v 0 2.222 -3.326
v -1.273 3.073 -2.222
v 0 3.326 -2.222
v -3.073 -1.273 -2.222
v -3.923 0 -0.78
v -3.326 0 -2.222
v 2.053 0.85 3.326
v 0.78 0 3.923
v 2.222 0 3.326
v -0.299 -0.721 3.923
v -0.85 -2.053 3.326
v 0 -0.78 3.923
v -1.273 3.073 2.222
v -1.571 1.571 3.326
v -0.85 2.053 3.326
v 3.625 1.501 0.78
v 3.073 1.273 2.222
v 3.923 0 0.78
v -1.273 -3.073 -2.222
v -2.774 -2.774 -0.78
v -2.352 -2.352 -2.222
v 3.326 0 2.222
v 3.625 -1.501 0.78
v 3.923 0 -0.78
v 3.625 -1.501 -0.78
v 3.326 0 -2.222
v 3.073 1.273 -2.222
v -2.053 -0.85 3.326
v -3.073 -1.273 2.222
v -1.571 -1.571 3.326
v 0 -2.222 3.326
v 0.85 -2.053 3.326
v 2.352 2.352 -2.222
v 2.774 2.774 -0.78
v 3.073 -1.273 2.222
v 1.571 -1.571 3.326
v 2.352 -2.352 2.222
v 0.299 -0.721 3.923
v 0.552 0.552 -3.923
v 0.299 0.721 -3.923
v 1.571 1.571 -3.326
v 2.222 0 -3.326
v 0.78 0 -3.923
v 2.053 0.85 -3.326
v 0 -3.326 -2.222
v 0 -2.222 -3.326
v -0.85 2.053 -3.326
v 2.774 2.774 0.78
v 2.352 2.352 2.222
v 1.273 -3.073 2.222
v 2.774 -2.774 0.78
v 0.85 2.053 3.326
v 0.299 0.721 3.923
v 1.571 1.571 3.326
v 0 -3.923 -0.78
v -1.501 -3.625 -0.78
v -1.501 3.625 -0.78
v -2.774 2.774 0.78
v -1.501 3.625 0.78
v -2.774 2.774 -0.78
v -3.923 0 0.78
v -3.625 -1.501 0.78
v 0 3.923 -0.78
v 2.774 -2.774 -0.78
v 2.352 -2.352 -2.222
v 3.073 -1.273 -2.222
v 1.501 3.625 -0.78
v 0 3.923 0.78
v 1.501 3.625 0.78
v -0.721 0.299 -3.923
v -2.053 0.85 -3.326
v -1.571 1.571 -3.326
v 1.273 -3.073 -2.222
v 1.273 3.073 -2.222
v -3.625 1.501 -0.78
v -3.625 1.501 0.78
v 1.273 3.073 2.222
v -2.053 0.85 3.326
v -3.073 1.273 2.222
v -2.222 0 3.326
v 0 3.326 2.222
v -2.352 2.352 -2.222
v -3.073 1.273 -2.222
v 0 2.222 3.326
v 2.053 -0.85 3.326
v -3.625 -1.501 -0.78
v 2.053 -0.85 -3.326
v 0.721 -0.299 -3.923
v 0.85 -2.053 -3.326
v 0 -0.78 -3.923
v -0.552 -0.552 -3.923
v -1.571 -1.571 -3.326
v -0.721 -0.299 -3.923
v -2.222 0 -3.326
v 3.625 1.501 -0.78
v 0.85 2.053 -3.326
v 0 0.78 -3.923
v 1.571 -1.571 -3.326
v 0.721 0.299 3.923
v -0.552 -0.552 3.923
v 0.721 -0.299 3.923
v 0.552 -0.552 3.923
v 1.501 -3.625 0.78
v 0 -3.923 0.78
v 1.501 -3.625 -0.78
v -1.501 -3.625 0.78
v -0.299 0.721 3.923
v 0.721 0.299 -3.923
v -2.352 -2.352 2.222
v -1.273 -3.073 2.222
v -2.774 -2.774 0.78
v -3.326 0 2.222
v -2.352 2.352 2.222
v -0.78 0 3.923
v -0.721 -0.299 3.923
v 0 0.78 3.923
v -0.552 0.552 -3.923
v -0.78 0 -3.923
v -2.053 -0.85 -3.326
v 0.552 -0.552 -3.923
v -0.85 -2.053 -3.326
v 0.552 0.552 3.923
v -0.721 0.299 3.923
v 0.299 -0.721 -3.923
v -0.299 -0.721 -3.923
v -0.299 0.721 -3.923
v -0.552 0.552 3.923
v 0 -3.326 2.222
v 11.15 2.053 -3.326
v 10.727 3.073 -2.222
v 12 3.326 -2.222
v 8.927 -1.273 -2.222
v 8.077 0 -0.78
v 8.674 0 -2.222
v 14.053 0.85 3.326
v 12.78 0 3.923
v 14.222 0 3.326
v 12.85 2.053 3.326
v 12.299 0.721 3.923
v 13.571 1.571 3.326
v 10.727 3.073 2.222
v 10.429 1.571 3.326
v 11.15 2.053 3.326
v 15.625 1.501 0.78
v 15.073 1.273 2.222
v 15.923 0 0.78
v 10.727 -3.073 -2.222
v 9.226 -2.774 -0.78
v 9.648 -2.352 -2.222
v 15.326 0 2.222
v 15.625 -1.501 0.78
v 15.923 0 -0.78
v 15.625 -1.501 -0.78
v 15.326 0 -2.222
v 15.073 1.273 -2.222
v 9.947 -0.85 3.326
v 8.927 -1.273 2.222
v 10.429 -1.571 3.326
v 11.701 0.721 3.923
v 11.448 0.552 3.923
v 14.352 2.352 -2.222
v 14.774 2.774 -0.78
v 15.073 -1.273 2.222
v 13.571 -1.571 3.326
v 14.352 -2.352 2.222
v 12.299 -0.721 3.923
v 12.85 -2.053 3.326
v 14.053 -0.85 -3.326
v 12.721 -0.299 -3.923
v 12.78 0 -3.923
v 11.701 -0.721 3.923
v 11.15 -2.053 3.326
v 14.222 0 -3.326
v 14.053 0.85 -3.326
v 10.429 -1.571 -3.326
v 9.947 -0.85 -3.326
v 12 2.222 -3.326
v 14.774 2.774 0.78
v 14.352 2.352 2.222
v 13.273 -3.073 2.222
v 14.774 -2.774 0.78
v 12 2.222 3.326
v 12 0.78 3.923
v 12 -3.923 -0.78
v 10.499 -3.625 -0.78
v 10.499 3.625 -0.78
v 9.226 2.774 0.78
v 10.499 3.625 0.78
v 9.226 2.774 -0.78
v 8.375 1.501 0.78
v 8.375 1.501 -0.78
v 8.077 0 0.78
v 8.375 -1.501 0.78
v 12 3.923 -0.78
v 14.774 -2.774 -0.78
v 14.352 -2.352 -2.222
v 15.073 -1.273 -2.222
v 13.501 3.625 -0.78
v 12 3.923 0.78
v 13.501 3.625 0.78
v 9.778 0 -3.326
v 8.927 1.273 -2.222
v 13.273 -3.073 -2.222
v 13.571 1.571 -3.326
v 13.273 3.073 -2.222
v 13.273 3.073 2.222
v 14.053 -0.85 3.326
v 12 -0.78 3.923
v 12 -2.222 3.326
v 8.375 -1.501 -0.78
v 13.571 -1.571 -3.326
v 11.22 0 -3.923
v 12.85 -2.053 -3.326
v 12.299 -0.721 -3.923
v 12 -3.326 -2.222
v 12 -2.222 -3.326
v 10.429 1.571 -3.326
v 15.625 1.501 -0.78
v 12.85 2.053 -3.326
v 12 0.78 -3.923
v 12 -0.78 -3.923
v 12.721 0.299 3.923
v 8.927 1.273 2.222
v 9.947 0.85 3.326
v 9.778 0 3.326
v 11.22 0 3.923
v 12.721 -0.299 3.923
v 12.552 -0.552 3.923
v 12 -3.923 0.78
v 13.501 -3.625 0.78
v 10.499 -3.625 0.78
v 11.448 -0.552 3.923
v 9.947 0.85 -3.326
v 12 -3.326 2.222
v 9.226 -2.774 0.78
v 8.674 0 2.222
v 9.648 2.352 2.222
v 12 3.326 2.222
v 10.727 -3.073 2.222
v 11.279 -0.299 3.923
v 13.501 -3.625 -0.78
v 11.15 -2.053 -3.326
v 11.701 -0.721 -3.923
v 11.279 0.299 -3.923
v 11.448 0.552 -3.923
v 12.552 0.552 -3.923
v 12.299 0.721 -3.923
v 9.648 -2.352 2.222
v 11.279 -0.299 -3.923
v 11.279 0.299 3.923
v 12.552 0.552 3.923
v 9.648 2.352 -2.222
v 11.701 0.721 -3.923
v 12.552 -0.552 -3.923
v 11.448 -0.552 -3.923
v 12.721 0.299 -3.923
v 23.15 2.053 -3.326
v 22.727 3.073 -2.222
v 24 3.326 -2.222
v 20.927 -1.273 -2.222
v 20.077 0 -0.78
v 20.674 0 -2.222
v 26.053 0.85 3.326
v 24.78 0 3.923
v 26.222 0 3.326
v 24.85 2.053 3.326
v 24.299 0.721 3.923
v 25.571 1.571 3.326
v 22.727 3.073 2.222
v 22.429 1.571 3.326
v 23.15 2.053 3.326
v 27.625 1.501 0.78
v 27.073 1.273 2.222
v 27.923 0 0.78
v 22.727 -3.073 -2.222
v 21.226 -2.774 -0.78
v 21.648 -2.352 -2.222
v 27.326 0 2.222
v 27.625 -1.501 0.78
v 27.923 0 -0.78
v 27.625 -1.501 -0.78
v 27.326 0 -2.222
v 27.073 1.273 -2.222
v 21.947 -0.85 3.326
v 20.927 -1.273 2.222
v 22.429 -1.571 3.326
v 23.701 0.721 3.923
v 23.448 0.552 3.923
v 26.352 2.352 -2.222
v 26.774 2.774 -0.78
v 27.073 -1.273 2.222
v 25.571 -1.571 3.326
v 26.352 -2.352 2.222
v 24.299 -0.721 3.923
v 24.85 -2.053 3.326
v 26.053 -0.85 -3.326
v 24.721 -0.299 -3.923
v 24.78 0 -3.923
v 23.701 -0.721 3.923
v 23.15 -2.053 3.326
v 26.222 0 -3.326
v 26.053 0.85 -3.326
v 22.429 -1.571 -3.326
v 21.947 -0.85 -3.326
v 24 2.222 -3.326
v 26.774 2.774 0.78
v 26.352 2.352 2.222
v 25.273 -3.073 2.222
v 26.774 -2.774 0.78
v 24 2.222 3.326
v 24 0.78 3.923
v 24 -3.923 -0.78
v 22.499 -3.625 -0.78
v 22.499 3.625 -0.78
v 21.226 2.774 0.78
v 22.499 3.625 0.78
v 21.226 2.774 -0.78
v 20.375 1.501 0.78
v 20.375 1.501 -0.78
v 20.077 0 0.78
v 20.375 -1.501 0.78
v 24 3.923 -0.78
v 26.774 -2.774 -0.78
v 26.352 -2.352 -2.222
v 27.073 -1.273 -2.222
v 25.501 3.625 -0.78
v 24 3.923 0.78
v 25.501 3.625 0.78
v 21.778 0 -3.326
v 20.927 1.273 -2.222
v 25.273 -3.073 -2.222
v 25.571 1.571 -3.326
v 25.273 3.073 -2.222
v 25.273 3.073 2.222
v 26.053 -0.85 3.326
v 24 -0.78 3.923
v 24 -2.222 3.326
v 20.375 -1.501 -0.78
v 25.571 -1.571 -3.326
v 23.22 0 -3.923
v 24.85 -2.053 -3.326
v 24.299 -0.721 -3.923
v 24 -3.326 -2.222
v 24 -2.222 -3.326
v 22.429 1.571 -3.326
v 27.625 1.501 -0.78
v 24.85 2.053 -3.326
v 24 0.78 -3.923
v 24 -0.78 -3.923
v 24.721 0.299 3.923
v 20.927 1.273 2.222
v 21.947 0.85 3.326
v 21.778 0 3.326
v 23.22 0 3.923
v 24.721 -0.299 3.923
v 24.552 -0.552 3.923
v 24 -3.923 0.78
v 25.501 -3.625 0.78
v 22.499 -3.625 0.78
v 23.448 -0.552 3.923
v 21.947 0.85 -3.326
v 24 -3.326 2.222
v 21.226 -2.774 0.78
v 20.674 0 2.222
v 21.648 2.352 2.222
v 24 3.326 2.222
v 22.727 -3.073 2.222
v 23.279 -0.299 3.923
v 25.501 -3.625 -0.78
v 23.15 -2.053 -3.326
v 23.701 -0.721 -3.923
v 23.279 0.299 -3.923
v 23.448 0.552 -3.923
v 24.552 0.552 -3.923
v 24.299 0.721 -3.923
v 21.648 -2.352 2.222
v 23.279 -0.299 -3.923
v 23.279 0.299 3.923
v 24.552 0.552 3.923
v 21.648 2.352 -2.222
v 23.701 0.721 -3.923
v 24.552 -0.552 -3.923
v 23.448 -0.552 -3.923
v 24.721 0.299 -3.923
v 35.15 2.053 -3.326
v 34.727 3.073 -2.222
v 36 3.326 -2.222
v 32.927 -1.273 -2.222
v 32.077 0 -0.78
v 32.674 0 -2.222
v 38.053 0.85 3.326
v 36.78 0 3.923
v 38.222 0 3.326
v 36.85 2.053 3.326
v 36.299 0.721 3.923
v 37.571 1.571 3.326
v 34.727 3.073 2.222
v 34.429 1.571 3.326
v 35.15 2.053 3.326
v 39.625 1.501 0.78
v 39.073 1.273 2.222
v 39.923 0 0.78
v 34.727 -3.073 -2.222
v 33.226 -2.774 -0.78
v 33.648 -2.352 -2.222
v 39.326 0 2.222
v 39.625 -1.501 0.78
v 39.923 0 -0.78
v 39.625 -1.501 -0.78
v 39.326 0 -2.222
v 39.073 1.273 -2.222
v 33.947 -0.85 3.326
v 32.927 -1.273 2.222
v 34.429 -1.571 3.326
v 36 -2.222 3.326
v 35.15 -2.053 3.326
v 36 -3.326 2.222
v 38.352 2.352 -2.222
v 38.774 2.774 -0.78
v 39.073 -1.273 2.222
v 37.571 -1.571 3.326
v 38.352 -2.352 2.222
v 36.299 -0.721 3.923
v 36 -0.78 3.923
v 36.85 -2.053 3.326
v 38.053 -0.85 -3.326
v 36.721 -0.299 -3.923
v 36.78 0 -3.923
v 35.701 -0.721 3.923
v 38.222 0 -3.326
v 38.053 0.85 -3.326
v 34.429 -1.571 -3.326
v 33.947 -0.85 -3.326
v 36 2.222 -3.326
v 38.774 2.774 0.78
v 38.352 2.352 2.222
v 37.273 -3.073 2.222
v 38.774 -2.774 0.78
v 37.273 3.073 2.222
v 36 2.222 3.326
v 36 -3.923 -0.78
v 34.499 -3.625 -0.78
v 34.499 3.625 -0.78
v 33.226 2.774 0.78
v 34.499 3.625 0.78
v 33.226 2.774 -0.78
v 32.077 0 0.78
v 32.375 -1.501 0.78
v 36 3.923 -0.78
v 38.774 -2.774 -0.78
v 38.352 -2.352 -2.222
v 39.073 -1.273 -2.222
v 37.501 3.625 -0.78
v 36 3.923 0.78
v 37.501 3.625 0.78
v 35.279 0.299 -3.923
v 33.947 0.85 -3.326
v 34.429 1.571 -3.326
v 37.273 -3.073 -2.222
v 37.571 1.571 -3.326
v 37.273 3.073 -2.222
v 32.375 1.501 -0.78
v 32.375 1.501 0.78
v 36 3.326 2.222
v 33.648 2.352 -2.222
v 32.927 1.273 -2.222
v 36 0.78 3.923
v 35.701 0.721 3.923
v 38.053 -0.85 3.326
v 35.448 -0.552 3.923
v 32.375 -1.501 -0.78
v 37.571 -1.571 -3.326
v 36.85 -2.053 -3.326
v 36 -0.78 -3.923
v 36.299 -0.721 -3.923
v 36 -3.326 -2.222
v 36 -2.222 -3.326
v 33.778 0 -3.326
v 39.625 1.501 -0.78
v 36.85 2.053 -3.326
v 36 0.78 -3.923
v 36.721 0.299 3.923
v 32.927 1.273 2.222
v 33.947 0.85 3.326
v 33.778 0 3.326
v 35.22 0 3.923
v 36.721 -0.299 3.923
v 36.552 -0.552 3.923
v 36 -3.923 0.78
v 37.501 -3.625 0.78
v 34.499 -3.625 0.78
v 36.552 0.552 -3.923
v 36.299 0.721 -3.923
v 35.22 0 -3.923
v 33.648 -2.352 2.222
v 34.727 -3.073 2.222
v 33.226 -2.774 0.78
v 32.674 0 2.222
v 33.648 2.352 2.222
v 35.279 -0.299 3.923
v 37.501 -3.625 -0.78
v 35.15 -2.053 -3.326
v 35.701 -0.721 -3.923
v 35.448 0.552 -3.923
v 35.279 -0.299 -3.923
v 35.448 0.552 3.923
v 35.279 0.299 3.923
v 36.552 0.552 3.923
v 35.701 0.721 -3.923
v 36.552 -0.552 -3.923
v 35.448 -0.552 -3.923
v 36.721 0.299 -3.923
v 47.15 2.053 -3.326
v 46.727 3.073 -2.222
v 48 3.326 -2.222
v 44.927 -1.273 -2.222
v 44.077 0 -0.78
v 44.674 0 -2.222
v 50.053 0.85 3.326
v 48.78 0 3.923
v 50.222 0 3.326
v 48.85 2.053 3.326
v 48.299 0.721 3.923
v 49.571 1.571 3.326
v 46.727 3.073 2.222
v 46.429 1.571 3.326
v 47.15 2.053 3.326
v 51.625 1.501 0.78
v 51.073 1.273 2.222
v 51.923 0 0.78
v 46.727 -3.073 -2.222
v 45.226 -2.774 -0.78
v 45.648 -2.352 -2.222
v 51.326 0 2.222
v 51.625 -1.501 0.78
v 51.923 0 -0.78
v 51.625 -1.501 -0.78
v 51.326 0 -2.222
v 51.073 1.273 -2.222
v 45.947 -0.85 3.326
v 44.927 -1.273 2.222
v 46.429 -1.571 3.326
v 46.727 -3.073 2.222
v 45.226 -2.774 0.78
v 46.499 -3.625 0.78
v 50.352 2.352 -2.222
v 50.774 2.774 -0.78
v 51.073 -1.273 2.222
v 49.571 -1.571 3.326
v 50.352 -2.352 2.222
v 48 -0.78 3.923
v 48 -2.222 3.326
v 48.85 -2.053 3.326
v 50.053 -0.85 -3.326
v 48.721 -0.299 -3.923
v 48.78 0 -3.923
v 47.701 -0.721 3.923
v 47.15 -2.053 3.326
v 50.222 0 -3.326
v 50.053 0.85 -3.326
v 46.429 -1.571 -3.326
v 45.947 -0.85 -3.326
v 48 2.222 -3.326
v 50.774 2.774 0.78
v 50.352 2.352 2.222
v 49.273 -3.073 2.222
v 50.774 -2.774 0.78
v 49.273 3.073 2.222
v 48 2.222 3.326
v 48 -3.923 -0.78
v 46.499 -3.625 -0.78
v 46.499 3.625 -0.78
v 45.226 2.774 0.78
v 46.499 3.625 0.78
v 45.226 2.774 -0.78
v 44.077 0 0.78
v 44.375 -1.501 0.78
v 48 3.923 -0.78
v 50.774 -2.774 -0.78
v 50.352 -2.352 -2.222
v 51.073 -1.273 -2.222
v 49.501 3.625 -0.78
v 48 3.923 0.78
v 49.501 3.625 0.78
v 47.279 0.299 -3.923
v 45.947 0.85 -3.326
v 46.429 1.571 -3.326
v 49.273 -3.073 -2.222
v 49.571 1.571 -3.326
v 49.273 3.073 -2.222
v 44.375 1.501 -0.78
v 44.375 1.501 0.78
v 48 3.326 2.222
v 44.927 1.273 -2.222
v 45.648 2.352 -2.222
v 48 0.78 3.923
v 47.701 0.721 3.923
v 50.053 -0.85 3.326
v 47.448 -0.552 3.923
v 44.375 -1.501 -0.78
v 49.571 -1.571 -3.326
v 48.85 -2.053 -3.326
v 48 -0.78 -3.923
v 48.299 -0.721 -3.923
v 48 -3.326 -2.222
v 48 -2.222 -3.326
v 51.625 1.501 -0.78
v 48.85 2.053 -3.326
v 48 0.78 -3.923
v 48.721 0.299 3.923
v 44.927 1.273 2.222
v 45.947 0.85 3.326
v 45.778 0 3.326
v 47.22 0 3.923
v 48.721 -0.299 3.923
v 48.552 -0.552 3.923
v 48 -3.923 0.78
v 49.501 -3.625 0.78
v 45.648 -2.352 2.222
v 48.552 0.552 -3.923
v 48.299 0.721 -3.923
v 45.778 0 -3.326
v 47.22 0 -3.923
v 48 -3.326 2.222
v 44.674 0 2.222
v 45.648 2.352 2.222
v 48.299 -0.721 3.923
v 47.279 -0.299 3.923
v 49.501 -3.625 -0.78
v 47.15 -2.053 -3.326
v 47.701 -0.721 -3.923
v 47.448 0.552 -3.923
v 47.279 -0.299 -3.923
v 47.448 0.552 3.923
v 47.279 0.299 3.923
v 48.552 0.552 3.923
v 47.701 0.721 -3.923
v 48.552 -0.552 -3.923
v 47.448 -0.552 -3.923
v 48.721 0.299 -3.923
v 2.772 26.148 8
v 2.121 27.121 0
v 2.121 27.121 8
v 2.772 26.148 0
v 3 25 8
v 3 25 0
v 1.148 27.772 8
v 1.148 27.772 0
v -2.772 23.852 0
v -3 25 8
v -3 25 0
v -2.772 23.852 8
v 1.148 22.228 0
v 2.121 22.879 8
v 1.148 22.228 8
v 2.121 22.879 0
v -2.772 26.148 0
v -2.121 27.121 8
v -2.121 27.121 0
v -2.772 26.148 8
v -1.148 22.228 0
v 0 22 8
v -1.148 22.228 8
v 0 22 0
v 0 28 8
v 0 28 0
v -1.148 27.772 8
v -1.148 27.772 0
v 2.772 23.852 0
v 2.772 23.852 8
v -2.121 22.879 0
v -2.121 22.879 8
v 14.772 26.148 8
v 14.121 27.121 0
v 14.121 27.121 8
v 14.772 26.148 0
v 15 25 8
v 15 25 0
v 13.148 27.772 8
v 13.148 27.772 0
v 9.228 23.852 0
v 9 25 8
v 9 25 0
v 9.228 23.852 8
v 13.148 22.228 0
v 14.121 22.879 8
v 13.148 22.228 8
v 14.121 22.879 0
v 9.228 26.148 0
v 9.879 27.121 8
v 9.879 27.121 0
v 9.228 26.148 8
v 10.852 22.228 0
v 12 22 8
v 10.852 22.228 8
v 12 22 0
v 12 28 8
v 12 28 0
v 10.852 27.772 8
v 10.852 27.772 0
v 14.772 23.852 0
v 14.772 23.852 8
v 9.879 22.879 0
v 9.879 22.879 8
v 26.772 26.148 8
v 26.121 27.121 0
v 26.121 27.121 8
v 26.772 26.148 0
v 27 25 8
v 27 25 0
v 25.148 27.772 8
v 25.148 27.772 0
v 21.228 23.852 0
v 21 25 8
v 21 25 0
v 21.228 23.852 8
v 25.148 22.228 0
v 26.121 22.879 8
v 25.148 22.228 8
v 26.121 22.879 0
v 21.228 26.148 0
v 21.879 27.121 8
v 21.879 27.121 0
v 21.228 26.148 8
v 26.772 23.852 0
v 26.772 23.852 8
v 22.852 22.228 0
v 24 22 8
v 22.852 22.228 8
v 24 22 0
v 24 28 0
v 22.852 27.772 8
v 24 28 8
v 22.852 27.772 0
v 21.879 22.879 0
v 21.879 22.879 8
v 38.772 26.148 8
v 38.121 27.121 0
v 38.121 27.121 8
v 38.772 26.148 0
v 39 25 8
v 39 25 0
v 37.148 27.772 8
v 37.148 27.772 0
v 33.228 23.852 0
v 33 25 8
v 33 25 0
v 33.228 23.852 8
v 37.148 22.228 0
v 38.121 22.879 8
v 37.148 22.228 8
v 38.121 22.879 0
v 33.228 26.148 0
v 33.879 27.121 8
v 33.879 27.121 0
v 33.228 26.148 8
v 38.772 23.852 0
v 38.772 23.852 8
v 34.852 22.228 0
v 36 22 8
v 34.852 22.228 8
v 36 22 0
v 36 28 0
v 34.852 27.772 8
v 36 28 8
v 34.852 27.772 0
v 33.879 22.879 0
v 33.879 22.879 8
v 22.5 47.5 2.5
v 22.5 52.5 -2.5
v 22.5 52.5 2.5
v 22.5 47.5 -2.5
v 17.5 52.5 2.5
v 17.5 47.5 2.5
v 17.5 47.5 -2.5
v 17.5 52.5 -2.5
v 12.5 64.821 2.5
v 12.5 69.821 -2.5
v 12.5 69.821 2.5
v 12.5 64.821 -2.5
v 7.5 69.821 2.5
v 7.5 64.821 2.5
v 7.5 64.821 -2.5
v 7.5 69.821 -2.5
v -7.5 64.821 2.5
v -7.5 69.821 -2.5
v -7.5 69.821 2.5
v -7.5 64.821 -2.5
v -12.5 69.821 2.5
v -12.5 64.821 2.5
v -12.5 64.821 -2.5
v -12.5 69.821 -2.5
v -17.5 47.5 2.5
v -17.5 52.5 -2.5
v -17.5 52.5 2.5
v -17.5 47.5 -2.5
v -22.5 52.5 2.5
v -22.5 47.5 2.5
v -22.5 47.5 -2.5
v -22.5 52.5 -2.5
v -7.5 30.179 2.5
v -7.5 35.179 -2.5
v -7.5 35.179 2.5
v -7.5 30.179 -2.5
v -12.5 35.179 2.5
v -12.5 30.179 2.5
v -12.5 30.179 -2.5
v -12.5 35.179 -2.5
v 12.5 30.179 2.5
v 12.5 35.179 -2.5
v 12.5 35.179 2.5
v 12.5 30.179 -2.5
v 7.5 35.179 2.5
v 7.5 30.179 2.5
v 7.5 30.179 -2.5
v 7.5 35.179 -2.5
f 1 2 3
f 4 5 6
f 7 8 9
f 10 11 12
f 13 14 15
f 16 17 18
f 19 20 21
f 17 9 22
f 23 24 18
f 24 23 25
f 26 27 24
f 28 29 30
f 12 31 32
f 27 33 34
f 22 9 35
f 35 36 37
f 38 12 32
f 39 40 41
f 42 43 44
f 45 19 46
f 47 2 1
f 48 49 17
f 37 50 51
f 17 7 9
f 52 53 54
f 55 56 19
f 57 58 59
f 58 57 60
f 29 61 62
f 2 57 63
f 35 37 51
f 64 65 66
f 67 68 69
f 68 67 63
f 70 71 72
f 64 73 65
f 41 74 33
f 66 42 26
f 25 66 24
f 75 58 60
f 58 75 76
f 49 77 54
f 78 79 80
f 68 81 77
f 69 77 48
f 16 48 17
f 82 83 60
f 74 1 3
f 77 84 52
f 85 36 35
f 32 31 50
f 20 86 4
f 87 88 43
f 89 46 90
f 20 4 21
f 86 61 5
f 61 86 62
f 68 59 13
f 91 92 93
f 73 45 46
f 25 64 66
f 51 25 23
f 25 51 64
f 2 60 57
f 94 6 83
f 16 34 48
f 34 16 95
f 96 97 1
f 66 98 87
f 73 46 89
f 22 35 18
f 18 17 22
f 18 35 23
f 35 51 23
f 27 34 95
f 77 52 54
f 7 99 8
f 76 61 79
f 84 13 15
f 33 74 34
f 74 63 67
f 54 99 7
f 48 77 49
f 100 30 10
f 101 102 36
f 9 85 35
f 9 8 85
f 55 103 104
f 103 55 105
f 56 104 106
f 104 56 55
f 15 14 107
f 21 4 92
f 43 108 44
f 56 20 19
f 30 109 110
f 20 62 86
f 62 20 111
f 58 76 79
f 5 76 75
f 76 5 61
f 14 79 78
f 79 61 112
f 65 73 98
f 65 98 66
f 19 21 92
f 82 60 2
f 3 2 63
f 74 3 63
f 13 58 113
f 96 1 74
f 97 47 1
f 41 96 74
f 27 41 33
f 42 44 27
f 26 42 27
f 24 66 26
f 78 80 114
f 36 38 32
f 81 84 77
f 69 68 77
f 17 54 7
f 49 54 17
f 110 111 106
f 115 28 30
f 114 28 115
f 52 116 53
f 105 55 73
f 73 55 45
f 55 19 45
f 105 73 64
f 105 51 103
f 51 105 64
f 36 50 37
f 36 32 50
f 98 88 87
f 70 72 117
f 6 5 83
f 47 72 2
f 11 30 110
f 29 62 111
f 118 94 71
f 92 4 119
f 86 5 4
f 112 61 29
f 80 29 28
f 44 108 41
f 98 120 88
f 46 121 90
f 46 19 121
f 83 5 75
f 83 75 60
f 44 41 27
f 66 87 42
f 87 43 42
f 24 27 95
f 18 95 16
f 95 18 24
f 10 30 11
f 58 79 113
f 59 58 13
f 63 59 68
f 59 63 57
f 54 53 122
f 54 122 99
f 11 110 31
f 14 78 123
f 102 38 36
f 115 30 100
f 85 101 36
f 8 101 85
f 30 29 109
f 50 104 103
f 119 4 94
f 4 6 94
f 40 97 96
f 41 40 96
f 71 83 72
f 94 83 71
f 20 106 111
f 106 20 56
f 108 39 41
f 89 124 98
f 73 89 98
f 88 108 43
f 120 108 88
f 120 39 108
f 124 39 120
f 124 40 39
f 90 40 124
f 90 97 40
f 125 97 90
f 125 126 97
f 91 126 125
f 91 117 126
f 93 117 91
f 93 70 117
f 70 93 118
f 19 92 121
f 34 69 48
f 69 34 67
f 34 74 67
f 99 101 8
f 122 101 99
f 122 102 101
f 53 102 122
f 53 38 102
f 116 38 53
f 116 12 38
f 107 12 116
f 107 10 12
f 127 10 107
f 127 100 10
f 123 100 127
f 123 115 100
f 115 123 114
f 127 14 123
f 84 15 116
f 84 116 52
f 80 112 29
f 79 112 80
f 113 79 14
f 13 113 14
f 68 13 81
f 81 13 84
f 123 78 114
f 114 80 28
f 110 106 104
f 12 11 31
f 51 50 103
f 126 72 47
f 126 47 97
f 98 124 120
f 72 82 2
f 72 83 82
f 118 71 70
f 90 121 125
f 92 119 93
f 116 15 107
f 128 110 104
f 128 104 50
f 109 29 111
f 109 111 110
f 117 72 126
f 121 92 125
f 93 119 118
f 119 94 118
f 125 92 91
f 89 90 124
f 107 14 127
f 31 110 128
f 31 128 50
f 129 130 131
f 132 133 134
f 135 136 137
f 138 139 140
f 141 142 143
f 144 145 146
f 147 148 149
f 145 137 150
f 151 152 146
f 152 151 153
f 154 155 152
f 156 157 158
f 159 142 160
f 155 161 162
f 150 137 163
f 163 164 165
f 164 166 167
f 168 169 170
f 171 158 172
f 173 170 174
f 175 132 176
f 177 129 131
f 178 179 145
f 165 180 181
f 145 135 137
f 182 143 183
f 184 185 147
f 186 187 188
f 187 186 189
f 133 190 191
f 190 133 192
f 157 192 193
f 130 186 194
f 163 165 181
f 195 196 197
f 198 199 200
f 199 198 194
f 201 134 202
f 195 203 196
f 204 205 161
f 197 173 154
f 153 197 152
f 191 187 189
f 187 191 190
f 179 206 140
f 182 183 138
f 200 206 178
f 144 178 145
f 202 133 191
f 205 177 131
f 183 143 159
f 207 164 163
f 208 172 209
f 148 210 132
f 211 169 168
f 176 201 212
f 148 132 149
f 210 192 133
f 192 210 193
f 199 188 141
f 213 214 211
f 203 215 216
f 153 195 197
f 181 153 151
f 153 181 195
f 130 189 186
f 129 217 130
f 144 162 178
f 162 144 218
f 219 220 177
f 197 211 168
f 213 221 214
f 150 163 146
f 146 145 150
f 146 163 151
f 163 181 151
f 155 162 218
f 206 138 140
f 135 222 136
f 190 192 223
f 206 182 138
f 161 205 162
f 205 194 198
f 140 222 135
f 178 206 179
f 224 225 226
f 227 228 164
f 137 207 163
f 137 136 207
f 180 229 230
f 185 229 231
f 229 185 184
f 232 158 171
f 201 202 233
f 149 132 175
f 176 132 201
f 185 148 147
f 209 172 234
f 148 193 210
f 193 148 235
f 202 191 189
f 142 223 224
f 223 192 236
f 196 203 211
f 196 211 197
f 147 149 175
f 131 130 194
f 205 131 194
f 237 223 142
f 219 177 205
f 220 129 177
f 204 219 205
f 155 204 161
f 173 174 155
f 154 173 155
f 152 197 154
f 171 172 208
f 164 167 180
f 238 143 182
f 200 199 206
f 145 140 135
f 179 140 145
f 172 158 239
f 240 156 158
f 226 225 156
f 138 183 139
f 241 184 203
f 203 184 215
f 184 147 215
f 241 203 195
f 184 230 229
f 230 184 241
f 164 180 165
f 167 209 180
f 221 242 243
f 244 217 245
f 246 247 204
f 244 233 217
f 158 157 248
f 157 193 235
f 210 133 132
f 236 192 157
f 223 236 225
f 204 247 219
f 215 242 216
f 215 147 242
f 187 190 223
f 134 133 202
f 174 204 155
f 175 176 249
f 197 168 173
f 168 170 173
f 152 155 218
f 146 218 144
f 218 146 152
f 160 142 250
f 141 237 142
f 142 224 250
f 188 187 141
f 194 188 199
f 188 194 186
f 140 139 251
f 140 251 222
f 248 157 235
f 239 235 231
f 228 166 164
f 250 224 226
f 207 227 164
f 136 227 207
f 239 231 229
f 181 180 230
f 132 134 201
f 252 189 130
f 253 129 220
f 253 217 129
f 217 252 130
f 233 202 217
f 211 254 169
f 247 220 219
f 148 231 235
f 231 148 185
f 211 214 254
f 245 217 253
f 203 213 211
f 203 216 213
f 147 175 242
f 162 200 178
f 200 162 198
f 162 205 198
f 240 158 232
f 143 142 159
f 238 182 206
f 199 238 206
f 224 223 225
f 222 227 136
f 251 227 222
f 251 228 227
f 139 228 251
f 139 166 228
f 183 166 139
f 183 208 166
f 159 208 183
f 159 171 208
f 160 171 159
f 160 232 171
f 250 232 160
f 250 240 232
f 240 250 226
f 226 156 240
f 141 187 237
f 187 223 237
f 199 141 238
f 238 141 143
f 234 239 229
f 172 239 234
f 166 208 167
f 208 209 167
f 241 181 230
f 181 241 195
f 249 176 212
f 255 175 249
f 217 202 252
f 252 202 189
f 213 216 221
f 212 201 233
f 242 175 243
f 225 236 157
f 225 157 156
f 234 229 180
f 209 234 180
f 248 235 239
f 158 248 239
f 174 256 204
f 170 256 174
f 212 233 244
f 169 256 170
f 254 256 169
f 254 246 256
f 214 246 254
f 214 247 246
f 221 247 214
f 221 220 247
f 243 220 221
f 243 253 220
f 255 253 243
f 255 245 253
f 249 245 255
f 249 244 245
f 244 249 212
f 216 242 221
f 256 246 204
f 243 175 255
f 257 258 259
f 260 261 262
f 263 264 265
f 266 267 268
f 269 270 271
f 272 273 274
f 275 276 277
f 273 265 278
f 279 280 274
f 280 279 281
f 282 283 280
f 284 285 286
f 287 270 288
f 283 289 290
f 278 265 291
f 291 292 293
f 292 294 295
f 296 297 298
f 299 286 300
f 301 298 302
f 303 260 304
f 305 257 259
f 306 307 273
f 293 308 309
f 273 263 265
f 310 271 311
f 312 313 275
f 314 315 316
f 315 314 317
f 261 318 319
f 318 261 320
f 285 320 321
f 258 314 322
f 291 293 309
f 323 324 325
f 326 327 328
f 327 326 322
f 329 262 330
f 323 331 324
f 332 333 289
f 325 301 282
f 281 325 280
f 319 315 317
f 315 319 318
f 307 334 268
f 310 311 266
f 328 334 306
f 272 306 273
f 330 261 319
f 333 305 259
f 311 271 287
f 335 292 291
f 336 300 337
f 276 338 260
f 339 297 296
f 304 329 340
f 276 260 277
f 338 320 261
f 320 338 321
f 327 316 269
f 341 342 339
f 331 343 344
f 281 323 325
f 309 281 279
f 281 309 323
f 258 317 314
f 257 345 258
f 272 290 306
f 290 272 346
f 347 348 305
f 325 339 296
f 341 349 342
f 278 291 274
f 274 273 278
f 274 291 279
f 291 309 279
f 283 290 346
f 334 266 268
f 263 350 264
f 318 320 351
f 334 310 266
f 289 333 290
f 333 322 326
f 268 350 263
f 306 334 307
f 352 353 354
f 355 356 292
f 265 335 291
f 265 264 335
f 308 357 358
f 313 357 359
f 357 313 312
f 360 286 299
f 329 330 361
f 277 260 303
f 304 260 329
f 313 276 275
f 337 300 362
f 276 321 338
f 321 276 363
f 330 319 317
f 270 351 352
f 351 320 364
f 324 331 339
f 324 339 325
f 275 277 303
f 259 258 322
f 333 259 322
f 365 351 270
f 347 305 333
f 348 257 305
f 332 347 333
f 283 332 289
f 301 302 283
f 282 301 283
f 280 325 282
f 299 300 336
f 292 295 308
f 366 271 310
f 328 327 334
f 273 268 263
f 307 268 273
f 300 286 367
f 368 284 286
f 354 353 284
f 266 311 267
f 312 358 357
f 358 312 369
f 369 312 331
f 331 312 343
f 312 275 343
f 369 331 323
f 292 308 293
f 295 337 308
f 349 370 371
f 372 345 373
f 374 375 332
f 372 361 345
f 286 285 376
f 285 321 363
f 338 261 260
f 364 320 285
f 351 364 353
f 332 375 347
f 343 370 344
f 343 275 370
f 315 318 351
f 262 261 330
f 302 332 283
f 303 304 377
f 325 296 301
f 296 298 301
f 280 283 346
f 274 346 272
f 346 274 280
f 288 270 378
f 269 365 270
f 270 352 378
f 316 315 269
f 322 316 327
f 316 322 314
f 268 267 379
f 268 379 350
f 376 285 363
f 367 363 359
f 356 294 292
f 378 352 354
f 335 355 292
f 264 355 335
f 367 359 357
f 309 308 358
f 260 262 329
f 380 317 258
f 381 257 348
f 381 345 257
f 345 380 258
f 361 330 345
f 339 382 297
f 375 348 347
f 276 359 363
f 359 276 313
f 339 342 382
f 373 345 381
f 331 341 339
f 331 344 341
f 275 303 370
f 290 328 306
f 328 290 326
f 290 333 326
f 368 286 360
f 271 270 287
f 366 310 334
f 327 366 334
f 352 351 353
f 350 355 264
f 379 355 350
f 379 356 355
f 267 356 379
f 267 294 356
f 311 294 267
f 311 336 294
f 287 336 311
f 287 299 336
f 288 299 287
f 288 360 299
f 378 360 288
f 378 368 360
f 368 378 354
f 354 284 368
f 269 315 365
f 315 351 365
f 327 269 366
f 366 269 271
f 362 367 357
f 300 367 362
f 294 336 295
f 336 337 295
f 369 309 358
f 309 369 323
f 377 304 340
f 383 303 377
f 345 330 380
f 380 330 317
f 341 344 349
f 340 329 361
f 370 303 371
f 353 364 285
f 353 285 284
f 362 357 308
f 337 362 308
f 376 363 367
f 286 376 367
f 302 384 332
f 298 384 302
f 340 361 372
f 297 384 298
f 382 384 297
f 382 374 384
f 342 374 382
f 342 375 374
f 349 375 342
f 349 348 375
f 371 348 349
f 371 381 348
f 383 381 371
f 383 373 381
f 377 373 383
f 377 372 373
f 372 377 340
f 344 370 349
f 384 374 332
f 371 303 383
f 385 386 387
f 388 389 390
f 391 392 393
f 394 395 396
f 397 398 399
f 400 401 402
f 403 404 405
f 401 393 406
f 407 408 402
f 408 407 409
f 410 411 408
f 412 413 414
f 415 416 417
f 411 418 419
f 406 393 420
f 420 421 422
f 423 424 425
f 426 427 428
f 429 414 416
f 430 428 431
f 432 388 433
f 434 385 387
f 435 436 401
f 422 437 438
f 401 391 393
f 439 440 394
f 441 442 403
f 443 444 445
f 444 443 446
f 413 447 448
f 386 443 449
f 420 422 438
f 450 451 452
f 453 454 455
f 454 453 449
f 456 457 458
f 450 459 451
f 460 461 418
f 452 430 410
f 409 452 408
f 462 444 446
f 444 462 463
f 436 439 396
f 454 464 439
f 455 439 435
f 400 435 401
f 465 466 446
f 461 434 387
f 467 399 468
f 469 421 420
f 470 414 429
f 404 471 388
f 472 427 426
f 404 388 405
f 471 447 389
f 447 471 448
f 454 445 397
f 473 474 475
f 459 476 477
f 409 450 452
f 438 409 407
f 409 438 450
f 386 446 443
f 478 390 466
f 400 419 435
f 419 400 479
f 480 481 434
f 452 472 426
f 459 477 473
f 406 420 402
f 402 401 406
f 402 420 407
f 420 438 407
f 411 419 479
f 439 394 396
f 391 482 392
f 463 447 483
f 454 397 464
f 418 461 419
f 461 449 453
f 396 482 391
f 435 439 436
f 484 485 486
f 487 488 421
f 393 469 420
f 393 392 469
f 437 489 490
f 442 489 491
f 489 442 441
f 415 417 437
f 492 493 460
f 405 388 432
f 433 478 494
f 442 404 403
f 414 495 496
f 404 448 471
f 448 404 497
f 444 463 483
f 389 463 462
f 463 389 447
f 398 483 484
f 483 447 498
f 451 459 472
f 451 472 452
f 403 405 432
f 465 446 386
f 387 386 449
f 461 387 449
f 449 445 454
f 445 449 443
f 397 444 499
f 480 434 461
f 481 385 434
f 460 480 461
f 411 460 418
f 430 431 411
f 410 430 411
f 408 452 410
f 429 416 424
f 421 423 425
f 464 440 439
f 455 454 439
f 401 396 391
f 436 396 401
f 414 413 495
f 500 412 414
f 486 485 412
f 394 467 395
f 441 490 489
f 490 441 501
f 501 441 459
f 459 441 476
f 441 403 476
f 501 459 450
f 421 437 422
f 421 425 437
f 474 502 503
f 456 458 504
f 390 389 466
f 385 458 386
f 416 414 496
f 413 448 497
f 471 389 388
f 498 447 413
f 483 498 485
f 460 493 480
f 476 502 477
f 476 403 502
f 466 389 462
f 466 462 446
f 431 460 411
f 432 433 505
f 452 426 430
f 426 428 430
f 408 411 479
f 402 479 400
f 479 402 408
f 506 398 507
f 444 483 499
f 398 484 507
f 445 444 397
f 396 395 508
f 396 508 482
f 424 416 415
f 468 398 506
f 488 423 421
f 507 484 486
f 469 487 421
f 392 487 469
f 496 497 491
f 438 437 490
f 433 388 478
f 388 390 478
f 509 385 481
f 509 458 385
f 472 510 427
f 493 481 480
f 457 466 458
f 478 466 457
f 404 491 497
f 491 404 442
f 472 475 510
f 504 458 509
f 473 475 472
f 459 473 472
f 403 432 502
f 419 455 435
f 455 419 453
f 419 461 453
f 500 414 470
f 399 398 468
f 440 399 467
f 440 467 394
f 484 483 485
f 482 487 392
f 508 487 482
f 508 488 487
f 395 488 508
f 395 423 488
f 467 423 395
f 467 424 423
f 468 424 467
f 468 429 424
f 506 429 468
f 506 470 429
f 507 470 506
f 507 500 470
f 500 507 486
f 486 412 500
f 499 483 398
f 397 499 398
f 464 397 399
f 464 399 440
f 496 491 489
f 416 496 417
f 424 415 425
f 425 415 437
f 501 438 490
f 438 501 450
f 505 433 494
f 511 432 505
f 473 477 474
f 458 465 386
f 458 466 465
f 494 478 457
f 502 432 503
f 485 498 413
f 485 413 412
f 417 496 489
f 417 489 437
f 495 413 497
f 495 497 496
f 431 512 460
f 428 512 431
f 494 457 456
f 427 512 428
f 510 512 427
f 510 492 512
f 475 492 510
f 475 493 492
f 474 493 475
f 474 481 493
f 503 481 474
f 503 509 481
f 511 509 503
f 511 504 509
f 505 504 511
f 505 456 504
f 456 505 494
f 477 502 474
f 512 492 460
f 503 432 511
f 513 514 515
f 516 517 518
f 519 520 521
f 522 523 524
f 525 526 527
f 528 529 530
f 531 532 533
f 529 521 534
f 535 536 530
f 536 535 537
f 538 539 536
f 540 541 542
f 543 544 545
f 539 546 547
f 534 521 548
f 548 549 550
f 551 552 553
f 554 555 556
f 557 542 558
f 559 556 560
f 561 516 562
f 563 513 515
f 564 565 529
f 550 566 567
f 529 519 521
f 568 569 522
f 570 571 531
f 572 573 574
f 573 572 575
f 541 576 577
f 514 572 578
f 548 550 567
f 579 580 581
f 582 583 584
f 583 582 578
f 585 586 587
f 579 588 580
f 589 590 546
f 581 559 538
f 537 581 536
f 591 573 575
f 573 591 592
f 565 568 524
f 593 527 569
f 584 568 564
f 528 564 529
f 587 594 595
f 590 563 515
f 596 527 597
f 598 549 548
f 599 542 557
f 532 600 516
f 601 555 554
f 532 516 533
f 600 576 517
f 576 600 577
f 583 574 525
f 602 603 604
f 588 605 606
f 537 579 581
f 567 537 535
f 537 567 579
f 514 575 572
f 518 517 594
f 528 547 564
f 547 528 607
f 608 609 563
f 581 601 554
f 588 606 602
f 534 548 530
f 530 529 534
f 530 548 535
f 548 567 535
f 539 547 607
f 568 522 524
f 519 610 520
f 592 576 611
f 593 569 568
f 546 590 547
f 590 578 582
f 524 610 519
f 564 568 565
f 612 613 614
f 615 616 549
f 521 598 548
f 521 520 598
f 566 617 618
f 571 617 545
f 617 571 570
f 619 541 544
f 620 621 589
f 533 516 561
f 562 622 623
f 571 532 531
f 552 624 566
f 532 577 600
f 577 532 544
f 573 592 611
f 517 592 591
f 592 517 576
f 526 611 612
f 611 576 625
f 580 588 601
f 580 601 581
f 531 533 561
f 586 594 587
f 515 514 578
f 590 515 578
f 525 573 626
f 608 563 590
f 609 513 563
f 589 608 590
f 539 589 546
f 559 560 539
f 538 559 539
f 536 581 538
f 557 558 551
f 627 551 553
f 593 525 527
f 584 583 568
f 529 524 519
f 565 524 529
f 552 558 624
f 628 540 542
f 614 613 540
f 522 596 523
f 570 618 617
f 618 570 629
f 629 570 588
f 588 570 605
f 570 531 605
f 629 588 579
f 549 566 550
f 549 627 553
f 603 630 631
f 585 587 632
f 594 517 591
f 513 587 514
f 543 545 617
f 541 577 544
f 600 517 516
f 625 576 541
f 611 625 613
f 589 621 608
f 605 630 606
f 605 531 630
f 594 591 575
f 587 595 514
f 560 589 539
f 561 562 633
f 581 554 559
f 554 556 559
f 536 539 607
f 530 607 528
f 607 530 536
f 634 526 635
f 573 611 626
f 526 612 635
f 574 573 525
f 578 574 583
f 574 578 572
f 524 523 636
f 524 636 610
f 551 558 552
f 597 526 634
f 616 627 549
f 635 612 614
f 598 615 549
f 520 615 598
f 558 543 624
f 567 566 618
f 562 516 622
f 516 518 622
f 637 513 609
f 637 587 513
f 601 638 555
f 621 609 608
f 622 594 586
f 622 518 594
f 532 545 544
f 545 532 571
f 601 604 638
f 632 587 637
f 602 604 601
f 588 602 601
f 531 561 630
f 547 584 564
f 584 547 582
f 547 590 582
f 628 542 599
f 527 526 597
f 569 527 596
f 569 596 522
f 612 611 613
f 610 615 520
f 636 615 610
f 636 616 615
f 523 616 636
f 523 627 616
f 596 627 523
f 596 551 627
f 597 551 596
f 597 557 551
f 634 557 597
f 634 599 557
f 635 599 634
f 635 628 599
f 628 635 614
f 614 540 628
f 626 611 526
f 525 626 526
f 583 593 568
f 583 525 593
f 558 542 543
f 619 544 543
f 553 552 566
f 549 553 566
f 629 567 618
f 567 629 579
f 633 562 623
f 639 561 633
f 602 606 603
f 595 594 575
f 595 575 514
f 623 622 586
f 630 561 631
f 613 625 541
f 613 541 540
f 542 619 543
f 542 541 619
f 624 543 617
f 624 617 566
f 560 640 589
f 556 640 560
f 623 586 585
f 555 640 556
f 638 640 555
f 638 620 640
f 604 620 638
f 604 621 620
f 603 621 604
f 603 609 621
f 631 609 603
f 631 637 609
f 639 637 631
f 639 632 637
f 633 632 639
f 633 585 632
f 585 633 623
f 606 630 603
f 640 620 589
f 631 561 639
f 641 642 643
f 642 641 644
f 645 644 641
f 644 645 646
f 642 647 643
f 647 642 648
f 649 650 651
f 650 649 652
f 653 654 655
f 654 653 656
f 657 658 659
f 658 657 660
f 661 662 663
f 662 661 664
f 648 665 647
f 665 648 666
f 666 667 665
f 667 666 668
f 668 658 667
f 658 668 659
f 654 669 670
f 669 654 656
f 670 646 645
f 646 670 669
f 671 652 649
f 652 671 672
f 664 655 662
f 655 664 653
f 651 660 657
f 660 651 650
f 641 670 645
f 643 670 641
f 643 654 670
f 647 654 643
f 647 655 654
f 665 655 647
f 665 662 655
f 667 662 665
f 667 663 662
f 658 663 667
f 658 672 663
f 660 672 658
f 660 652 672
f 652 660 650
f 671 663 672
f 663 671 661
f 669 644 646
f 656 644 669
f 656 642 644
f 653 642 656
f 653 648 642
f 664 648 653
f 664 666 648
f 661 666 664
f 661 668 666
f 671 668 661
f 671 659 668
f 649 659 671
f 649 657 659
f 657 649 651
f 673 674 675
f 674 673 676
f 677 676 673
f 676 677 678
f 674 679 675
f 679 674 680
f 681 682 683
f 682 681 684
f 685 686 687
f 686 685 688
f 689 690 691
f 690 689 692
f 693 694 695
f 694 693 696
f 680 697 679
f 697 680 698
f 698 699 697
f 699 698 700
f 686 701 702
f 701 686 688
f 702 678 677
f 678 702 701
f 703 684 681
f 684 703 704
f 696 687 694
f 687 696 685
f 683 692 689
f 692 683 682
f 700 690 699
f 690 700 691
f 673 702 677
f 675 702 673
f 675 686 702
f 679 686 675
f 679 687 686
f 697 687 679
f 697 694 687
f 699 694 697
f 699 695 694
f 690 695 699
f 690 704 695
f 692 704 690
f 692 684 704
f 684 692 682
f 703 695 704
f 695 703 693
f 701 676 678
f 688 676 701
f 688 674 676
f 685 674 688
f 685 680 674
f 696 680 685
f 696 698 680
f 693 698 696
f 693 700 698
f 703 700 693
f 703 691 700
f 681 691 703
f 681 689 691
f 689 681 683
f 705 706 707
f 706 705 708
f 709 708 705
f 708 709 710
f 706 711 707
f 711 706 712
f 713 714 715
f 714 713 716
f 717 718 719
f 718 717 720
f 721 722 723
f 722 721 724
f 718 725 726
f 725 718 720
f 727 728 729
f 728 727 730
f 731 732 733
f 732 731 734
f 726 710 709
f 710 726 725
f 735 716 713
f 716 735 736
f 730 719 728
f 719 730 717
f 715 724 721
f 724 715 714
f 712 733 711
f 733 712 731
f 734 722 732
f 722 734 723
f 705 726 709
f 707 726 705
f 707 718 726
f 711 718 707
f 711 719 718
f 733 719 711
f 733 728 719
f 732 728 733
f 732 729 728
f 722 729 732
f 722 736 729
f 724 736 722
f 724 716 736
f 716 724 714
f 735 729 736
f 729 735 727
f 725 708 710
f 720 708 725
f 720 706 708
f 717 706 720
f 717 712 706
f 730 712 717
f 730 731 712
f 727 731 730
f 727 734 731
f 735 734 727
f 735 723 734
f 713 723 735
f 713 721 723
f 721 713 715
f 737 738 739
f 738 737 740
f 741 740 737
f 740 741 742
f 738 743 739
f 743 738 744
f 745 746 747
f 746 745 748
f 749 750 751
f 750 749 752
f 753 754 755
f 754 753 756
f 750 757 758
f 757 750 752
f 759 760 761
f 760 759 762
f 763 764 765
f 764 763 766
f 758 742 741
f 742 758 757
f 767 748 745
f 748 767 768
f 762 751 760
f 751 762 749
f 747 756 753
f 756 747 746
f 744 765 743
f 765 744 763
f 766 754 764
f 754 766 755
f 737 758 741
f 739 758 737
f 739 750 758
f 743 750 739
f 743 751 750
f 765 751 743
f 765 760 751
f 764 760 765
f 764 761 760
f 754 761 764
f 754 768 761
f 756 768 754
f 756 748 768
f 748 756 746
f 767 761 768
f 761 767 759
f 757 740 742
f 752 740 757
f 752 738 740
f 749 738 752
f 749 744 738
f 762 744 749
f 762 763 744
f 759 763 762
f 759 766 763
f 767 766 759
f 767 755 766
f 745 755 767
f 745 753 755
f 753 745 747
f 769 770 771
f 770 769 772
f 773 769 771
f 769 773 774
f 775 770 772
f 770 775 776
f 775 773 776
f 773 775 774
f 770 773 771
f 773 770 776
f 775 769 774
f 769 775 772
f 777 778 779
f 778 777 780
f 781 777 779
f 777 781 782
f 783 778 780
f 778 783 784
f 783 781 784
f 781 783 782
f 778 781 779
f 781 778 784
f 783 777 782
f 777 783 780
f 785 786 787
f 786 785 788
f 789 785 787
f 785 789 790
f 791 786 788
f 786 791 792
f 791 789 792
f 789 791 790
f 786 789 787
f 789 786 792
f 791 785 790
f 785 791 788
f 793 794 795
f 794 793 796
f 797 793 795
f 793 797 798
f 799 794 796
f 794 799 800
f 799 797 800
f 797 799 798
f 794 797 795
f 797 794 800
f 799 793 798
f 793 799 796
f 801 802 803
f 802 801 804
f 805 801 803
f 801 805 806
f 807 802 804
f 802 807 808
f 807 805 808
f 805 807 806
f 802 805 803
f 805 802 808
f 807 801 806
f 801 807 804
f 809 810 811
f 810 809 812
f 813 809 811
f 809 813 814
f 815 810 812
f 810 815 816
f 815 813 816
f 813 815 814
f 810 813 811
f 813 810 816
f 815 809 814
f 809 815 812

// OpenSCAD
// TEST 09: for loops — range, step, list
// Expected tree: for node with children placed in a pattern.
// Check: viewport shows an evenly spaced row/grid of shapes.

$fn = 16;

// range loop: 5 spheres along X
for (i = [0:4]) {
    translate([i * 12, 0, 0]) {
        sphere(r=4);
    }
}

// range with step: 4 cylinders at Y=25 with step 2
for (i = [0:2:6]) {
    translate([i * 6, 25, 0]) {
        cylinder(h=8, r=3);
    }
}

// list loop: cubes at specific angles around a circle
for (a = [0, 60, 120, 180, 240, 300]) {
    translate([cos(a)*20, sin(a)*20 + 50, 0]) {
        cube([5, 5, 5], center=true);
    }
}
